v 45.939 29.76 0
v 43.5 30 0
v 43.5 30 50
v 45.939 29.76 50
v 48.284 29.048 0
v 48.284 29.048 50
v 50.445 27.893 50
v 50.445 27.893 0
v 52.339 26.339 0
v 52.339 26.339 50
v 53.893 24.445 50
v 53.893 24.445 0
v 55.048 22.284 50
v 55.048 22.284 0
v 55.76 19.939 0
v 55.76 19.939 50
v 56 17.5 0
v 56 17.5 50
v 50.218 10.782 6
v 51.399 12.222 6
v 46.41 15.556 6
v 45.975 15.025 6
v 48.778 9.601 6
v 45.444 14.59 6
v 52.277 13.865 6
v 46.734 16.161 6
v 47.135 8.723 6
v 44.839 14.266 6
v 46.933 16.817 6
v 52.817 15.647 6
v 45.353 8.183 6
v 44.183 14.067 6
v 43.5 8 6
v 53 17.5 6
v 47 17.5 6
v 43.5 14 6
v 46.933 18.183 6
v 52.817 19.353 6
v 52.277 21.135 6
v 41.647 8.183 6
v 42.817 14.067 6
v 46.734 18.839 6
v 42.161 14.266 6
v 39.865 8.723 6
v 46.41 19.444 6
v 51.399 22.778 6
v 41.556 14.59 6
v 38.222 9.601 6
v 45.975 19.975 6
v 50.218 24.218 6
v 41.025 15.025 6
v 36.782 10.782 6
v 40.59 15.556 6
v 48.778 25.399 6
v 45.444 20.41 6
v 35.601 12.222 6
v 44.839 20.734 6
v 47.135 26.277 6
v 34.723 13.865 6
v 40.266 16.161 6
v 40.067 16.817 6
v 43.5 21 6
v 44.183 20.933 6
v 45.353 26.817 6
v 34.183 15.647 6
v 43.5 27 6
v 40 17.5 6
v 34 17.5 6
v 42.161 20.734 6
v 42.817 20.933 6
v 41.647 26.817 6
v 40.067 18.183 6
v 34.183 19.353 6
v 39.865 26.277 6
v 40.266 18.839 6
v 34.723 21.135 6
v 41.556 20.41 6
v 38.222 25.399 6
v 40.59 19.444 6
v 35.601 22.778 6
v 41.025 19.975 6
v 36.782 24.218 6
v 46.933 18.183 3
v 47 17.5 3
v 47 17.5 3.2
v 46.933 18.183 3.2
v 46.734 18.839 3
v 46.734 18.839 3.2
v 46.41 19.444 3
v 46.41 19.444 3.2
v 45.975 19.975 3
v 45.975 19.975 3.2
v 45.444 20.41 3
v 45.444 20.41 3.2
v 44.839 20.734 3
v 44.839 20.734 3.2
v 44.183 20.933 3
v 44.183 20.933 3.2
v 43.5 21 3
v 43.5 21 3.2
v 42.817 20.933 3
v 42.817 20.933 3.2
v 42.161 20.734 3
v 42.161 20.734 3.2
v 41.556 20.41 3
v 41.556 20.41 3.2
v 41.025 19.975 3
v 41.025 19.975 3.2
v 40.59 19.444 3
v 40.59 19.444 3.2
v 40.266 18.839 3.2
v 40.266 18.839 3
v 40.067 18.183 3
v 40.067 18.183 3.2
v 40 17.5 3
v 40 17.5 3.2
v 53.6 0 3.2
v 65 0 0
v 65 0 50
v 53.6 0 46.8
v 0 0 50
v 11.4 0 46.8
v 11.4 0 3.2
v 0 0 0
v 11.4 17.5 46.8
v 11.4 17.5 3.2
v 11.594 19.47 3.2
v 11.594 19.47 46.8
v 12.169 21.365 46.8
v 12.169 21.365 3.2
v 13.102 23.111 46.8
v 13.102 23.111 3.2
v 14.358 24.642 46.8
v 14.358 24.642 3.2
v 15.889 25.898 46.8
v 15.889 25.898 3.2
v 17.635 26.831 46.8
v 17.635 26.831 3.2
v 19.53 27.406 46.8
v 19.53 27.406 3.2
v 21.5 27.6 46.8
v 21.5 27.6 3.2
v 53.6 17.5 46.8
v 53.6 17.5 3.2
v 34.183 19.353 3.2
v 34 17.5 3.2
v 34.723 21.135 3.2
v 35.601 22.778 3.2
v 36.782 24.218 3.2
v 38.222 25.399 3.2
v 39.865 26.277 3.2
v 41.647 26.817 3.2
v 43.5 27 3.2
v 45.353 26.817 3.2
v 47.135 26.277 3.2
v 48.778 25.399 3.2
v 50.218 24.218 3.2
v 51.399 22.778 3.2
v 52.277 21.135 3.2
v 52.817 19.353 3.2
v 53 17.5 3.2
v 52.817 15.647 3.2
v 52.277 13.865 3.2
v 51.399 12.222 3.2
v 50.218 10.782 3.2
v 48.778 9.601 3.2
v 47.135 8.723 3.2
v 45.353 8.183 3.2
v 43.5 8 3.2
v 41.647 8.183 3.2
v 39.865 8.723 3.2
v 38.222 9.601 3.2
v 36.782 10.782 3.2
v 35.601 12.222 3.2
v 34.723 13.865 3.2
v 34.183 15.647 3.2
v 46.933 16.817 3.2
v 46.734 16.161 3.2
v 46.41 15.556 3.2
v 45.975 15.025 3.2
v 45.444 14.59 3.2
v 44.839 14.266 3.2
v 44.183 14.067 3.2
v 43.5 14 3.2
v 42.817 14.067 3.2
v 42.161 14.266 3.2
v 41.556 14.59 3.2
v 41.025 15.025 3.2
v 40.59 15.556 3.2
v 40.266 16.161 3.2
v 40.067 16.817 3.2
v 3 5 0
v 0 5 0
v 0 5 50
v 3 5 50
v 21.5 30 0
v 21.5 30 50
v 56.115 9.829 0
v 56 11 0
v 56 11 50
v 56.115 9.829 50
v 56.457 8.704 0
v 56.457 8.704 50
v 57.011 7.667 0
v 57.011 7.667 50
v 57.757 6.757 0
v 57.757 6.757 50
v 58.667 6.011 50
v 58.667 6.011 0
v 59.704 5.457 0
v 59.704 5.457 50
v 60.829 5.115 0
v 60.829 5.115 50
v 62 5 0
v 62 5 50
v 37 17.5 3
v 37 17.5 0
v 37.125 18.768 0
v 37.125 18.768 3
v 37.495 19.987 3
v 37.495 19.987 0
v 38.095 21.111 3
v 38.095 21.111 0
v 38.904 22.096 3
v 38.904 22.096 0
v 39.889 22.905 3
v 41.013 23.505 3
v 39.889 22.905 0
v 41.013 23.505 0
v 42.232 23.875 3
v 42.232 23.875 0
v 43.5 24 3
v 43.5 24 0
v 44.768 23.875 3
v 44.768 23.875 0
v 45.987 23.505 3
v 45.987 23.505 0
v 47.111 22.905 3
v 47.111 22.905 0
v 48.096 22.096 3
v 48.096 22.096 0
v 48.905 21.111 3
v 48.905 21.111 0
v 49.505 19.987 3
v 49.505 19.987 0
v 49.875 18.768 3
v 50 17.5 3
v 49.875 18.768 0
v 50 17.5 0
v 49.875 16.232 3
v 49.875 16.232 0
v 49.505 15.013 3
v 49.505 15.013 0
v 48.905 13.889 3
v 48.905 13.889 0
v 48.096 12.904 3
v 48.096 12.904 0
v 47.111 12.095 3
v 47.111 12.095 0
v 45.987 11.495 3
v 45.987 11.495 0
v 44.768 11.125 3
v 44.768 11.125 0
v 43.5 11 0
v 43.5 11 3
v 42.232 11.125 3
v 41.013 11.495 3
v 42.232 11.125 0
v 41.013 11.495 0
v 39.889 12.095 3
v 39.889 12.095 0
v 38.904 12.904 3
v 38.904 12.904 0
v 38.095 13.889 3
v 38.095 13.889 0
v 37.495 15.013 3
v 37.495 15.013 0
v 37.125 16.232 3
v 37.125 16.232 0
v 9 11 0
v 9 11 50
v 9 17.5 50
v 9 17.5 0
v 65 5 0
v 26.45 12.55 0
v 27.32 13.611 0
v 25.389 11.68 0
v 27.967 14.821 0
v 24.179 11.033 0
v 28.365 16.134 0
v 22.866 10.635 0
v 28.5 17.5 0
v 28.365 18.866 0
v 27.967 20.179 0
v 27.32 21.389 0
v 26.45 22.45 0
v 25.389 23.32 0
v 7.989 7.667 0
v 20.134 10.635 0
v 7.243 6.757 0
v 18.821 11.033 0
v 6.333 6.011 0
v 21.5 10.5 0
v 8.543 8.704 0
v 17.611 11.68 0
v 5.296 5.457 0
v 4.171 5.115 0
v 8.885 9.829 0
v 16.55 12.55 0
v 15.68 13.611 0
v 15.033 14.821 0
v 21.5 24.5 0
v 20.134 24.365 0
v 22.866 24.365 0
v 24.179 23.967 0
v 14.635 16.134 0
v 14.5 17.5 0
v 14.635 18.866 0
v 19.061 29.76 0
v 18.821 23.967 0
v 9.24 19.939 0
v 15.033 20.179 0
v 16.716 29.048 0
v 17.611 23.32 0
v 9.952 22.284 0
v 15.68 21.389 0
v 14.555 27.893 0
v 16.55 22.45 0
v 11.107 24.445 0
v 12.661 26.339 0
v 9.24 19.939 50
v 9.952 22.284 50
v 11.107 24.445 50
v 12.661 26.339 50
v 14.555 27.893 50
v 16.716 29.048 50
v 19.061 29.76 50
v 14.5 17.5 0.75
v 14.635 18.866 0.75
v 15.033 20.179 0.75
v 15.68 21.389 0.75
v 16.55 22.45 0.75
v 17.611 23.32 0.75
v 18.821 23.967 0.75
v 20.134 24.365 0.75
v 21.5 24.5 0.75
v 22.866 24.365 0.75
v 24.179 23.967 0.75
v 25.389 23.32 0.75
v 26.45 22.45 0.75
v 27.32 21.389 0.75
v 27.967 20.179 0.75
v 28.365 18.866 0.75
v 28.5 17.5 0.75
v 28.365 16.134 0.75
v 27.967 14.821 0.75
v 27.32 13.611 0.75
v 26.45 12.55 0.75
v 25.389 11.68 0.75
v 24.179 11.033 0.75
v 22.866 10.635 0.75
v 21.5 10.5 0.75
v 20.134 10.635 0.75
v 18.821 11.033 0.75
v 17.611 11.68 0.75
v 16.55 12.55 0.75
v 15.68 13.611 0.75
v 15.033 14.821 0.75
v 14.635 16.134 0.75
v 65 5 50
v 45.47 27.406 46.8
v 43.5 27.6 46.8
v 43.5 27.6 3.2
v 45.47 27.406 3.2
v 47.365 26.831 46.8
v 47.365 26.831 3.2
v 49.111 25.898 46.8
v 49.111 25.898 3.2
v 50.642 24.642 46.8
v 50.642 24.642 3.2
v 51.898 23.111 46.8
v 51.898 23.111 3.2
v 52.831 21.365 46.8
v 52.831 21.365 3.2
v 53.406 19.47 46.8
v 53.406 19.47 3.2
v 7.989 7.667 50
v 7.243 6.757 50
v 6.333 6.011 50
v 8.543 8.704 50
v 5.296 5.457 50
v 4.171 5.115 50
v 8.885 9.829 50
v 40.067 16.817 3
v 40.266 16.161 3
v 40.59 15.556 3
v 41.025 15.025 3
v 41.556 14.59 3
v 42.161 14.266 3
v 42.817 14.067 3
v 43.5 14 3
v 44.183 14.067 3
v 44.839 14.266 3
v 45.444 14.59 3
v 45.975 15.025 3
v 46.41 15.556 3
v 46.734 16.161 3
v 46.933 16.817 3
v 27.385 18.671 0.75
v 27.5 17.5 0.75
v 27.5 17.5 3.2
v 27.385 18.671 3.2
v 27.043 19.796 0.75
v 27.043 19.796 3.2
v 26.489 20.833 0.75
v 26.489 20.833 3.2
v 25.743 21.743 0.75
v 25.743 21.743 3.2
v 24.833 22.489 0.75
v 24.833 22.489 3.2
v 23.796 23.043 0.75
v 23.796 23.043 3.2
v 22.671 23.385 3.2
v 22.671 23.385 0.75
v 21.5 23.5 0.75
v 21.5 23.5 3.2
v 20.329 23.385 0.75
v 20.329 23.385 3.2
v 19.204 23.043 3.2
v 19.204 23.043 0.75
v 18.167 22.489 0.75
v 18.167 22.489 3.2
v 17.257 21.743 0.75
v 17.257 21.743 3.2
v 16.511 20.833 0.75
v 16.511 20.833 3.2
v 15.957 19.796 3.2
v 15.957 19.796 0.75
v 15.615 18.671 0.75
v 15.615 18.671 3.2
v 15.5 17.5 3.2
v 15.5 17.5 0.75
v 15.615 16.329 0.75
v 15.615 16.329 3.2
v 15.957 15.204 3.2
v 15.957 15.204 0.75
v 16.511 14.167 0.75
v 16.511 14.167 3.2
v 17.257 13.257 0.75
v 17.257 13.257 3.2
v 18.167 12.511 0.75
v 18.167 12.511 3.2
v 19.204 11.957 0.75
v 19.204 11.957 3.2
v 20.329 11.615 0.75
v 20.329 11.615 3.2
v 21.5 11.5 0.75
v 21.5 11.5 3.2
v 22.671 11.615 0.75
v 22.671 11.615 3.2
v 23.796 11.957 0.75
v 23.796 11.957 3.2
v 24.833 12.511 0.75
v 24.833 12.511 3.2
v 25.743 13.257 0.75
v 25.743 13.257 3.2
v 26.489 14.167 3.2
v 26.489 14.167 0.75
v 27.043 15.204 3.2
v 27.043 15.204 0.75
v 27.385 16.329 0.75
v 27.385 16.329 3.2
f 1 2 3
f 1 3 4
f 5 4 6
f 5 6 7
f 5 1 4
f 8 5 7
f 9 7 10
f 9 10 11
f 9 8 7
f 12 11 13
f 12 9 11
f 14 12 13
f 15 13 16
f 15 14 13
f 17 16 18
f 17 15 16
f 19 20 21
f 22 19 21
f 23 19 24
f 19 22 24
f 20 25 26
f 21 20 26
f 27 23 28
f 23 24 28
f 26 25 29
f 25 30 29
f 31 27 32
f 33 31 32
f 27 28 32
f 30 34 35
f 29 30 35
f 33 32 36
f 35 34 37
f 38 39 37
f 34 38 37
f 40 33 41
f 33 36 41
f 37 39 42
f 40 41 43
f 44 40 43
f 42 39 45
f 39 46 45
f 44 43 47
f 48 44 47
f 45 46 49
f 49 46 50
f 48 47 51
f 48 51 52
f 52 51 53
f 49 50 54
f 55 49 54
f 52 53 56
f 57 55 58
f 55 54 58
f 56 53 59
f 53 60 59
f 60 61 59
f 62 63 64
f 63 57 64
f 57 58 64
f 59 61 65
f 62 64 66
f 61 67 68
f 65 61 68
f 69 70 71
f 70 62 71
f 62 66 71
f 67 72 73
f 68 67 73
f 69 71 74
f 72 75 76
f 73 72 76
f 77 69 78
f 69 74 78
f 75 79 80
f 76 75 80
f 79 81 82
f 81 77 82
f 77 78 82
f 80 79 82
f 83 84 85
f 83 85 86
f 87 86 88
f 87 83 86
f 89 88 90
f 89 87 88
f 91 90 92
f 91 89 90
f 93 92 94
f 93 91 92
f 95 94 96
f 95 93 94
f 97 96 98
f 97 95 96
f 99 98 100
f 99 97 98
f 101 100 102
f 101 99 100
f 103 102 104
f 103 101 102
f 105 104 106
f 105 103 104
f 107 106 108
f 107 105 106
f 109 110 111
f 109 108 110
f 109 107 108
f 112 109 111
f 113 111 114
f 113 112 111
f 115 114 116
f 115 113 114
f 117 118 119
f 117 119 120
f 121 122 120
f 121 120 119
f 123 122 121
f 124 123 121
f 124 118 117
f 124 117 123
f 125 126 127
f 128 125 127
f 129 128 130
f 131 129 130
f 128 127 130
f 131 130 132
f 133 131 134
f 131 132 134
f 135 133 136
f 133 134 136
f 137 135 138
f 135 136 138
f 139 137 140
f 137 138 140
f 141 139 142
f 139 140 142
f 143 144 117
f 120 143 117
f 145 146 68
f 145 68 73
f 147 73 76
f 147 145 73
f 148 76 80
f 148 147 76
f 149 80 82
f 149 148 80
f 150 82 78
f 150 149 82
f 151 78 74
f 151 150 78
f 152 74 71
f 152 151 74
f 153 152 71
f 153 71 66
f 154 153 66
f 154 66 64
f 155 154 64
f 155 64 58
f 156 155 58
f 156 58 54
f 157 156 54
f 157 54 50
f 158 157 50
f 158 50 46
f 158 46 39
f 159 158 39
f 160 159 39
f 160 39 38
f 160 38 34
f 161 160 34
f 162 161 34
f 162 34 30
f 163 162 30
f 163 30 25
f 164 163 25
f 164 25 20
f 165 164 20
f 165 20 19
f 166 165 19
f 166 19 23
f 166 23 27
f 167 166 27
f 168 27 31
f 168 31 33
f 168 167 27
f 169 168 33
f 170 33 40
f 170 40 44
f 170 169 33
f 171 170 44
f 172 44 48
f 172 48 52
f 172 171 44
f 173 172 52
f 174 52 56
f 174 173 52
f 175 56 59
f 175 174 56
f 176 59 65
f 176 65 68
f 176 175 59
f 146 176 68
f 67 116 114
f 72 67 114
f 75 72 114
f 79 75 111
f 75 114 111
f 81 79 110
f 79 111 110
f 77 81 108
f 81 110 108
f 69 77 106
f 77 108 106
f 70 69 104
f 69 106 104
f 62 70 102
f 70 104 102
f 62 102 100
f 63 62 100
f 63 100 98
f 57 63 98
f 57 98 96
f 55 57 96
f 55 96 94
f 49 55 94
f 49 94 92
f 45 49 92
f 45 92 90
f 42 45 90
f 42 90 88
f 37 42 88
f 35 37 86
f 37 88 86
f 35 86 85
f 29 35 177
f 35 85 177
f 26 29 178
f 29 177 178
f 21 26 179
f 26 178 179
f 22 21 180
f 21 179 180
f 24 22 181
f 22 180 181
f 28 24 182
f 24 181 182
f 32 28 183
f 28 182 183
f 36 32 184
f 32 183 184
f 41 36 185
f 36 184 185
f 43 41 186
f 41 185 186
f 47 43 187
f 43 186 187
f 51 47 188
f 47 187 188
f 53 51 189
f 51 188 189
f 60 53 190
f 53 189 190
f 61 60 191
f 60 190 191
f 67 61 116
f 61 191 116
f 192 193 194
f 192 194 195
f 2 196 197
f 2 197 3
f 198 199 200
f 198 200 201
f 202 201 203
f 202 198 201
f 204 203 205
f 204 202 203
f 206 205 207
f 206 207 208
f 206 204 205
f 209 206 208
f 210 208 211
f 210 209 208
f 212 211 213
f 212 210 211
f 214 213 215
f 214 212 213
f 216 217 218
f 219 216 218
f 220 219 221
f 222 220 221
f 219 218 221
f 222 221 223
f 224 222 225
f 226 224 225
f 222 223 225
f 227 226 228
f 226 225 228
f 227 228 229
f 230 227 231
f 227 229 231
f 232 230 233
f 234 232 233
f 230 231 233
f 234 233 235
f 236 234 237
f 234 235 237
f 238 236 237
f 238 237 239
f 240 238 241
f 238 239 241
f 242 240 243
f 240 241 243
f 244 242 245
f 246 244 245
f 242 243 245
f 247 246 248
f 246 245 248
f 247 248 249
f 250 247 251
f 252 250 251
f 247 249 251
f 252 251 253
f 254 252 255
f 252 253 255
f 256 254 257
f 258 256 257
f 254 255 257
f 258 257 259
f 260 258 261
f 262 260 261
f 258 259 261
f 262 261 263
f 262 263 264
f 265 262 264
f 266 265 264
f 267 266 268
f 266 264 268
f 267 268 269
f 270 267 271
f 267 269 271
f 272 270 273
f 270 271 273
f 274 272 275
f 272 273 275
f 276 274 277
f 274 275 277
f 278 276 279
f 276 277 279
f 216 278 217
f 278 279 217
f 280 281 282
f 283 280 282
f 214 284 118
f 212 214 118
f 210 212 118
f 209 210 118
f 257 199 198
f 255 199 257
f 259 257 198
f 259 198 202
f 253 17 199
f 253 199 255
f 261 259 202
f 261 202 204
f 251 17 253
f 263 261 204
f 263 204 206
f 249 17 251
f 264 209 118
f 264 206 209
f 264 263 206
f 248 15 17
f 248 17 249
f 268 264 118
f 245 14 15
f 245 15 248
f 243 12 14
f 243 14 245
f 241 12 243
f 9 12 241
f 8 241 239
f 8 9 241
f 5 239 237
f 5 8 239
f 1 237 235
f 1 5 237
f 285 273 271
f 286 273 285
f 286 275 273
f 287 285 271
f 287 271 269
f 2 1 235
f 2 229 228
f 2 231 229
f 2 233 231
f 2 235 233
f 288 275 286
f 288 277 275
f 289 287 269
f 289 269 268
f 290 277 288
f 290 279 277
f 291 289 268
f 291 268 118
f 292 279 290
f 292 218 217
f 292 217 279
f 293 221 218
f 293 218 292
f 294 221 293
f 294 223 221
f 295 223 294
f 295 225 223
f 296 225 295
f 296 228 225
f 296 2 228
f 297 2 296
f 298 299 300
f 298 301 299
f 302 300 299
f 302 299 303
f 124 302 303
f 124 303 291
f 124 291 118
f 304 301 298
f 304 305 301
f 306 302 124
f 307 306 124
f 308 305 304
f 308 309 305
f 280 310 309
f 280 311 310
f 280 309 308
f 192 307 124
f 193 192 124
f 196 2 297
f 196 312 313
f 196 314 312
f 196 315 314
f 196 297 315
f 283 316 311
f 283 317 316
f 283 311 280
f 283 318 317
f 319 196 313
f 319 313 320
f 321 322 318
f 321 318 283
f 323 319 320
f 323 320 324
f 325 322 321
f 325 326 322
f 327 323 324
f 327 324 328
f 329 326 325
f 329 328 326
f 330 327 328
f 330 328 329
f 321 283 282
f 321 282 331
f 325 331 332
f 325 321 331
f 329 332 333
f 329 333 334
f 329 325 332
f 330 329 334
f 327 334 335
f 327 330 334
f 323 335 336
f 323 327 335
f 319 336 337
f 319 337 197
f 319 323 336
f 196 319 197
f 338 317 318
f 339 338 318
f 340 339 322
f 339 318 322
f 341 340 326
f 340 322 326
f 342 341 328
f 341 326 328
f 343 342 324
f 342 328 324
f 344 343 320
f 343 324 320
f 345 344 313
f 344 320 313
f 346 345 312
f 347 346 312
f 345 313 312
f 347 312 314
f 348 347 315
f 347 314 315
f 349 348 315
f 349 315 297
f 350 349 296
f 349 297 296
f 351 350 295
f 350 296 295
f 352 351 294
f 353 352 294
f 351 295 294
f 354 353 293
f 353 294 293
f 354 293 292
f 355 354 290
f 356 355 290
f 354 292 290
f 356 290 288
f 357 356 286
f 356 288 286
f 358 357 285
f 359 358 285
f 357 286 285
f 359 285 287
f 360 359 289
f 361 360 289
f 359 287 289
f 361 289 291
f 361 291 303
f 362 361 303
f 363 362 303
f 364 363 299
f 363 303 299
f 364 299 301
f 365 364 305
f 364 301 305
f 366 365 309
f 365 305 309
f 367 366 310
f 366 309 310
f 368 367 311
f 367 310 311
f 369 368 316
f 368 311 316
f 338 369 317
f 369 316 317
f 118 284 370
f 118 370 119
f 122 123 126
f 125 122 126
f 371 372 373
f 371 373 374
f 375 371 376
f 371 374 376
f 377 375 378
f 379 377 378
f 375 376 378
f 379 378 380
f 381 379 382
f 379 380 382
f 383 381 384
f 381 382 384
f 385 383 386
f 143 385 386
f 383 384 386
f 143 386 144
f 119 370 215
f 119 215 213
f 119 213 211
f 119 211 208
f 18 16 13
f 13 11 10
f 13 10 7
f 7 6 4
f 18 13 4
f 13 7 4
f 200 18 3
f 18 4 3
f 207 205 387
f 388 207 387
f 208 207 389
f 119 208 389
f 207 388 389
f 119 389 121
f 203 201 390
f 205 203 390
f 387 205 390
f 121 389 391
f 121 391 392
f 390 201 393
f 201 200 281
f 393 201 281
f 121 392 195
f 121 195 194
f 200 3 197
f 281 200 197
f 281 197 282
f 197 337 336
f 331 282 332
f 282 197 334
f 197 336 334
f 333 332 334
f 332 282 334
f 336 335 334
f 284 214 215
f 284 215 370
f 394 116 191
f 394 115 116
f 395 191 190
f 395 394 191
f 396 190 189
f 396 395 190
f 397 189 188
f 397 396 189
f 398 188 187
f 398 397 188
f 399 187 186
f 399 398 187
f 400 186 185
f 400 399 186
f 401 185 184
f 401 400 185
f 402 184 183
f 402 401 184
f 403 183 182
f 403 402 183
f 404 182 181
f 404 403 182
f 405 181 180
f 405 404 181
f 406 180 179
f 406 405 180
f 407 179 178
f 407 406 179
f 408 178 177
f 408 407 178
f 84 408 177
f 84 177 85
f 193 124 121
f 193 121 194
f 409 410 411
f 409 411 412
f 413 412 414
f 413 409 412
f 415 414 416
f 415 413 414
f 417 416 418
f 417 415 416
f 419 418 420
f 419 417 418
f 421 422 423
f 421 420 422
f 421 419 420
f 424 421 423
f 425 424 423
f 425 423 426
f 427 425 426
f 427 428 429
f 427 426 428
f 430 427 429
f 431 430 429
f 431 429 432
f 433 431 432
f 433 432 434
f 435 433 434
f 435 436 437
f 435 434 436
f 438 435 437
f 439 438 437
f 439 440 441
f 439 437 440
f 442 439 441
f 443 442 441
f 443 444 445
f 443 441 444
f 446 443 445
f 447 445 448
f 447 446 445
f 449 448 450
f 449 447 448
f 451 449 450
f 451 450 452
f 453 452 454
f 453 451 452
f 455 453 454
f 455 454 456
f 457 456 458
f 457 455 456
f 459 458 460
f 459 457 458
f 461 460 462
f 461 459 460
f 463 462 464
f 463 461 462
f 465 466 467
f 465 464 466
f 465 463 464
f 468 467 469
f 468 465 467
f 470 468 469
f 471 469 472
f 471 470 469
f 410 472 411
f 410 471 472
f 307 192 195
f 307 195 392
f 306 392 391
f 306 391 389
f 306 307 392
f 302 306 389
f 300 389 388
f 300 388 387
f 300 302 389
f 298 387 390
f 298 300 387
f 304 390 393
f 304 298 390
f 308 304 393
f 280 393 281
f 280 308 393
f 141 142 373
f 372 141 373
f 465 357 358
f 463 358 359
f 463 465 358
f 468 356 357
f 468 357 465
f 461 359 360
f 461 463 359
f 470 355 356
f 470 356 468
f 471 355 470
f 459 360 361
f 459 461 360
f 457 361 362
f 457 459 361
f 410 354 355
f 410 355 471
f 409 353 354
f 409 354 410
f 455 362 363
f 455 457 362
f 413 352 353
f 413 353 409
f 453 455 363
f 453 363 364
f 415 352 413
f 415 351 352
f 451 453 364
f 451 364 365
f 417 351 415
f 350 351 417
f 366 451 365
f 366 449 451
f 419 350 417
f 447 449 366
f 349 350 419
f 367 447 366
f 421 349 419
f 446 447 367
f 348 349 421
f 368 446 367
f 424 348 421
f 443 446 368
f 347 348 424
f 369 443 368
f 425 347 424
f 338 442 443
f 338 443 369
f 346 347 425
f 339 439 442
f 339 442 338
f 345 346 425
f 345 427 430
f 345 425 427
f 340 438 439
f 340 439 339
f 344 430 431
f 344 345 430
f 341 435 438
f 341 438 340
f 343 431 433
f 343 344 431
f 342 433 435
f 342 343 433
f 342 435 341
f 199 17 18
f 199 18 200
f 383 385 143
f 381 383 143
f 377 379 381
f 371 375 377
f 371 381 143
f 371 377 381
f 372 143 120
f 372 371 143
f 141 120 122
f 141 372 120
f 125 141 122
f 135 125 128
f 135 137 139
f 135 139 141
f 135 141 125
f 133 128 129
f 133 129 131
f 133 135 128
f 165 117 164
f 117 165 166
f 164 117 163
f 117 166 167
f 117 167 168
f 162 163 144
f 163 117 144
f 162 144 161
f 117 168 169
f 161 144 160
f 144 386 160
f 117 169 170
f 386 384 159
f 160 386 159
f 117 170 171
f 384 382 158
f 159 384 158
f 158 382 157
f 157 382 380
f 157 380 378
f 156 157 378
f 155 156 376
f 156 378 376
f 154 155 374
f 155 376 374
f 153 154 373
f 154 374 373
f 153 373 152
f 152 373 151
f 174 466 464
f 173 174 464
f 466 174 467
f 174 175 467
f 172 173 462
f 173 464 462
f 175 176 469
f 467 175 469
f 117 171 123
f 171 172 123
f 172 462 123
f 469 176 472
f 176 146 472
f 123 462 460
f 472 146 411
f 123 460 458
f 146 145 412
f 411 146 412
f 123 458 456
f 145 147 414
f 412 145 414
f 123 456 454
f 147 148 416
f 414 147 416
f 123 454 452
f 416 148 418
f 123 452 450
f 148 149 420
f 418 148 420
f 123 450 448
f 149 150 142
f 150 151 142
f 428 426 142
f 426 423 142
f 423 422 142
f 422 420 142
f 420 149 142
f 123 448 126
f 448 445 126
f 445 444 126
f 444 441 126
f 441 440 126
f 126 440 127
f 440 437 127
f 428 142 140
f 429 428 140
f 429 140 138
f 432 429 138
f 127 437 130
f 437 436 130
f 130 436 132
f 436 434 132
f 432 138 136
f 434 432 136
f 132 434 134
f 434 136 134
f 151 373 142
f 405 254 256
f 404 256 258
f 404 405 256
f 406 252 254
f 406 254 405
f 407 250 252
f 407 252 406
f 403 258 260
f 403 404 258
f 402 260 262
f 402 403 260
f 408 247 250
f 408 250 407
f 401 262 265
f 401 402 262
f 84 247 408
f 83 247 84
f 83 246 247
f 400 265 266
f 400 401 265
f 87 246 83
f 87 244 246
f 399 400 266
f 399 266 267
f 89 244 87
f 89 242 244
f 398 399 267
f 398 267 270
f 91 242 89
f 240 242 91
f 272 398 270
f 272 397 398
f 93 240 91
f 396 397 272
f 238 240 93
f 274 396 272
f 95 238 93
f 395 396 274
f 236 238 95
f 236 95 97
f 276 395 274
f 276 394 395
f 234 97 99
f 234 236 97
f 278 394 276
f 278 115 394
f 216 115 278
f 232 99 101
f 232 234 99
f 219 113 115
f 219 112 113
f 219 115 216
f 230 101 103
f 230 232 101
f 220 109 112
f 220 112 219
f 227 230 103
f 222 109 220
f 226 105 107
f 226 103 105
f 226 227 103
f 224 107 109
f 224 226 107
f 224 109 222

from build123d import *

# Parameters (mm, degrees)
EXTRUDE_1_DEPTH     = 50
CUT_EXTRUDE_START   = -3.2
CUT_EXTRUDE_1_DEPTH = 43.6
SKETCH_1_4_R        = 6
SKETCH_1_4_R_2      = 3.5
CUT_EXTRUDE_2_DEPTH = 10
SKETCH_3_R          = 9.5
SKETCH_3_R_2        = 3.5
EXTRUDE_3_DEPTH     = 6
SKETCH_3_3_R        = 6.5
CUT_EXTRUDE_3_DEPTH = 3
SKETCH_3_4_R        = 7
CUT_EXTRUDE_4_DEPTH = 0.75


with BuildPart() as part:
    # Эскиз1 → Бобышка-Вытянуть1 (new body)
    with BuildSketch(Plane.XY):
        with BuildLine():
            Line((0, 0), (0, 5))
            Line((0, 5), (3, 5))
            ThreePointArc((3, 5), (7.242640687, 6.757359313), (9, 11))
            Line((9, 11), (9, 17.5))
            ThreePointArc((9, 17.5), (12.661165235, 26.338834765), (21.5, 30))
            Line((21.5, 30), (43.5, 30))
            ThreePointArc((43.5, 30), (52.338834765, 26.338834765), (56, 17.5))
            Line((56, 17.5), (56, 11))
            ThreePointArc((56, 11), (57.757359313, 6.757359313), (62, 5))
            Line((62, 5), (65, 5))
            Line((65, 5), (65, 0))
            Line((65, 0), (0, 0))
        make_face()
    extrude(amount=EXTRUDE_1_DEPTH)

    # Эскиз2 → Вырез-Вытянуть1 (cut)
    with BuildSketch(Plane(origin=(0, 0, 0), x_dir=(-1, 0, 0), z_dir=(0, 0, -1)).offset(CUT_EXTRUDE_START)):
        with BuildLine():
            Line((-21.5, 27.6), (-43.5, 27.6))
            ThreePointArc((-43.5, 27.6), (-50.64177849, 24.64177849), (-53.6, 17.5))
            Line((-53.6, 17.5), (-53.6, 0))
            Line((-53.6, 0), (-11.4, 0))
            Line((-11.4, 0), (-11.4, 17.5))
            ThreePointArc((-11.4, 17.5), (-14.35822151, 24.64177849), (-21.5, 27.6))
        make_face()
    extrude(amount=-CUT_EXTRUDE_1_DEPTH, mode=Mode.SUBTRACT)

    # Эскиз1<4> → Вырез-Вытянуть2 (cut)
    with BuildSketch(Plane.XY):
        with Locations((21.5, 17.5)):
            Circle(SKETCH_1_4_R)
        with Locations((43.5, 17.5)):
            Circle(SKETCH_1_4_R_2)
    extrude(amount=CUT_EXTRUDE_2_DEPTH, mode=Mode.SUBTRACT)

    # Эскиз3 → Бобышка-Вытянуть3 (add)
    with BuildSketch(Plane(origin=(0, 0, 0), x_dir=(-1, 0, 0), z_dir=(0, 0, -1))):
        with Locations((-43.5, 17.5)):
            Circle(SKETCH_3_R)
        with Locations((-43.5, 17.5)):
            Circle(SKETCH_3_R_2, mode=Mode.SUBTRACT)
    extrude(amount=-EXTRUDE_3_DEPTH)

    # Эскиз3<3> → Вырез-Вытянуть3 (cut)
    with BuildSketch(Plane(origin=(0, 0, 0), x_dir=(-1, 0, 0), z_dir=(0, 0, -1))):
        with Locations((-43.5, 17.5)):
            Circle(SKETCH_3_3_R)
    extrude(amount=-CUT_EXTRUDE_3_DEPTH, mode=Mode.SUBTRACT)

    # Эскиз3<4> → Вырез-Вытянуть4 (cut)
    with BuildSketch(Plane(origin=(0, 0, 0), x_dir=(-1, 0, 0), z_dir=(0, 0, -1))):
        with Locations((-21.5, 17.5)):
            Circle(SKETCH_3_4_R)
    extrude(amount=-CUT_EXTRUDE_4_DEPTH, mode=Mode.SUBTRACT)


solid = part.part
